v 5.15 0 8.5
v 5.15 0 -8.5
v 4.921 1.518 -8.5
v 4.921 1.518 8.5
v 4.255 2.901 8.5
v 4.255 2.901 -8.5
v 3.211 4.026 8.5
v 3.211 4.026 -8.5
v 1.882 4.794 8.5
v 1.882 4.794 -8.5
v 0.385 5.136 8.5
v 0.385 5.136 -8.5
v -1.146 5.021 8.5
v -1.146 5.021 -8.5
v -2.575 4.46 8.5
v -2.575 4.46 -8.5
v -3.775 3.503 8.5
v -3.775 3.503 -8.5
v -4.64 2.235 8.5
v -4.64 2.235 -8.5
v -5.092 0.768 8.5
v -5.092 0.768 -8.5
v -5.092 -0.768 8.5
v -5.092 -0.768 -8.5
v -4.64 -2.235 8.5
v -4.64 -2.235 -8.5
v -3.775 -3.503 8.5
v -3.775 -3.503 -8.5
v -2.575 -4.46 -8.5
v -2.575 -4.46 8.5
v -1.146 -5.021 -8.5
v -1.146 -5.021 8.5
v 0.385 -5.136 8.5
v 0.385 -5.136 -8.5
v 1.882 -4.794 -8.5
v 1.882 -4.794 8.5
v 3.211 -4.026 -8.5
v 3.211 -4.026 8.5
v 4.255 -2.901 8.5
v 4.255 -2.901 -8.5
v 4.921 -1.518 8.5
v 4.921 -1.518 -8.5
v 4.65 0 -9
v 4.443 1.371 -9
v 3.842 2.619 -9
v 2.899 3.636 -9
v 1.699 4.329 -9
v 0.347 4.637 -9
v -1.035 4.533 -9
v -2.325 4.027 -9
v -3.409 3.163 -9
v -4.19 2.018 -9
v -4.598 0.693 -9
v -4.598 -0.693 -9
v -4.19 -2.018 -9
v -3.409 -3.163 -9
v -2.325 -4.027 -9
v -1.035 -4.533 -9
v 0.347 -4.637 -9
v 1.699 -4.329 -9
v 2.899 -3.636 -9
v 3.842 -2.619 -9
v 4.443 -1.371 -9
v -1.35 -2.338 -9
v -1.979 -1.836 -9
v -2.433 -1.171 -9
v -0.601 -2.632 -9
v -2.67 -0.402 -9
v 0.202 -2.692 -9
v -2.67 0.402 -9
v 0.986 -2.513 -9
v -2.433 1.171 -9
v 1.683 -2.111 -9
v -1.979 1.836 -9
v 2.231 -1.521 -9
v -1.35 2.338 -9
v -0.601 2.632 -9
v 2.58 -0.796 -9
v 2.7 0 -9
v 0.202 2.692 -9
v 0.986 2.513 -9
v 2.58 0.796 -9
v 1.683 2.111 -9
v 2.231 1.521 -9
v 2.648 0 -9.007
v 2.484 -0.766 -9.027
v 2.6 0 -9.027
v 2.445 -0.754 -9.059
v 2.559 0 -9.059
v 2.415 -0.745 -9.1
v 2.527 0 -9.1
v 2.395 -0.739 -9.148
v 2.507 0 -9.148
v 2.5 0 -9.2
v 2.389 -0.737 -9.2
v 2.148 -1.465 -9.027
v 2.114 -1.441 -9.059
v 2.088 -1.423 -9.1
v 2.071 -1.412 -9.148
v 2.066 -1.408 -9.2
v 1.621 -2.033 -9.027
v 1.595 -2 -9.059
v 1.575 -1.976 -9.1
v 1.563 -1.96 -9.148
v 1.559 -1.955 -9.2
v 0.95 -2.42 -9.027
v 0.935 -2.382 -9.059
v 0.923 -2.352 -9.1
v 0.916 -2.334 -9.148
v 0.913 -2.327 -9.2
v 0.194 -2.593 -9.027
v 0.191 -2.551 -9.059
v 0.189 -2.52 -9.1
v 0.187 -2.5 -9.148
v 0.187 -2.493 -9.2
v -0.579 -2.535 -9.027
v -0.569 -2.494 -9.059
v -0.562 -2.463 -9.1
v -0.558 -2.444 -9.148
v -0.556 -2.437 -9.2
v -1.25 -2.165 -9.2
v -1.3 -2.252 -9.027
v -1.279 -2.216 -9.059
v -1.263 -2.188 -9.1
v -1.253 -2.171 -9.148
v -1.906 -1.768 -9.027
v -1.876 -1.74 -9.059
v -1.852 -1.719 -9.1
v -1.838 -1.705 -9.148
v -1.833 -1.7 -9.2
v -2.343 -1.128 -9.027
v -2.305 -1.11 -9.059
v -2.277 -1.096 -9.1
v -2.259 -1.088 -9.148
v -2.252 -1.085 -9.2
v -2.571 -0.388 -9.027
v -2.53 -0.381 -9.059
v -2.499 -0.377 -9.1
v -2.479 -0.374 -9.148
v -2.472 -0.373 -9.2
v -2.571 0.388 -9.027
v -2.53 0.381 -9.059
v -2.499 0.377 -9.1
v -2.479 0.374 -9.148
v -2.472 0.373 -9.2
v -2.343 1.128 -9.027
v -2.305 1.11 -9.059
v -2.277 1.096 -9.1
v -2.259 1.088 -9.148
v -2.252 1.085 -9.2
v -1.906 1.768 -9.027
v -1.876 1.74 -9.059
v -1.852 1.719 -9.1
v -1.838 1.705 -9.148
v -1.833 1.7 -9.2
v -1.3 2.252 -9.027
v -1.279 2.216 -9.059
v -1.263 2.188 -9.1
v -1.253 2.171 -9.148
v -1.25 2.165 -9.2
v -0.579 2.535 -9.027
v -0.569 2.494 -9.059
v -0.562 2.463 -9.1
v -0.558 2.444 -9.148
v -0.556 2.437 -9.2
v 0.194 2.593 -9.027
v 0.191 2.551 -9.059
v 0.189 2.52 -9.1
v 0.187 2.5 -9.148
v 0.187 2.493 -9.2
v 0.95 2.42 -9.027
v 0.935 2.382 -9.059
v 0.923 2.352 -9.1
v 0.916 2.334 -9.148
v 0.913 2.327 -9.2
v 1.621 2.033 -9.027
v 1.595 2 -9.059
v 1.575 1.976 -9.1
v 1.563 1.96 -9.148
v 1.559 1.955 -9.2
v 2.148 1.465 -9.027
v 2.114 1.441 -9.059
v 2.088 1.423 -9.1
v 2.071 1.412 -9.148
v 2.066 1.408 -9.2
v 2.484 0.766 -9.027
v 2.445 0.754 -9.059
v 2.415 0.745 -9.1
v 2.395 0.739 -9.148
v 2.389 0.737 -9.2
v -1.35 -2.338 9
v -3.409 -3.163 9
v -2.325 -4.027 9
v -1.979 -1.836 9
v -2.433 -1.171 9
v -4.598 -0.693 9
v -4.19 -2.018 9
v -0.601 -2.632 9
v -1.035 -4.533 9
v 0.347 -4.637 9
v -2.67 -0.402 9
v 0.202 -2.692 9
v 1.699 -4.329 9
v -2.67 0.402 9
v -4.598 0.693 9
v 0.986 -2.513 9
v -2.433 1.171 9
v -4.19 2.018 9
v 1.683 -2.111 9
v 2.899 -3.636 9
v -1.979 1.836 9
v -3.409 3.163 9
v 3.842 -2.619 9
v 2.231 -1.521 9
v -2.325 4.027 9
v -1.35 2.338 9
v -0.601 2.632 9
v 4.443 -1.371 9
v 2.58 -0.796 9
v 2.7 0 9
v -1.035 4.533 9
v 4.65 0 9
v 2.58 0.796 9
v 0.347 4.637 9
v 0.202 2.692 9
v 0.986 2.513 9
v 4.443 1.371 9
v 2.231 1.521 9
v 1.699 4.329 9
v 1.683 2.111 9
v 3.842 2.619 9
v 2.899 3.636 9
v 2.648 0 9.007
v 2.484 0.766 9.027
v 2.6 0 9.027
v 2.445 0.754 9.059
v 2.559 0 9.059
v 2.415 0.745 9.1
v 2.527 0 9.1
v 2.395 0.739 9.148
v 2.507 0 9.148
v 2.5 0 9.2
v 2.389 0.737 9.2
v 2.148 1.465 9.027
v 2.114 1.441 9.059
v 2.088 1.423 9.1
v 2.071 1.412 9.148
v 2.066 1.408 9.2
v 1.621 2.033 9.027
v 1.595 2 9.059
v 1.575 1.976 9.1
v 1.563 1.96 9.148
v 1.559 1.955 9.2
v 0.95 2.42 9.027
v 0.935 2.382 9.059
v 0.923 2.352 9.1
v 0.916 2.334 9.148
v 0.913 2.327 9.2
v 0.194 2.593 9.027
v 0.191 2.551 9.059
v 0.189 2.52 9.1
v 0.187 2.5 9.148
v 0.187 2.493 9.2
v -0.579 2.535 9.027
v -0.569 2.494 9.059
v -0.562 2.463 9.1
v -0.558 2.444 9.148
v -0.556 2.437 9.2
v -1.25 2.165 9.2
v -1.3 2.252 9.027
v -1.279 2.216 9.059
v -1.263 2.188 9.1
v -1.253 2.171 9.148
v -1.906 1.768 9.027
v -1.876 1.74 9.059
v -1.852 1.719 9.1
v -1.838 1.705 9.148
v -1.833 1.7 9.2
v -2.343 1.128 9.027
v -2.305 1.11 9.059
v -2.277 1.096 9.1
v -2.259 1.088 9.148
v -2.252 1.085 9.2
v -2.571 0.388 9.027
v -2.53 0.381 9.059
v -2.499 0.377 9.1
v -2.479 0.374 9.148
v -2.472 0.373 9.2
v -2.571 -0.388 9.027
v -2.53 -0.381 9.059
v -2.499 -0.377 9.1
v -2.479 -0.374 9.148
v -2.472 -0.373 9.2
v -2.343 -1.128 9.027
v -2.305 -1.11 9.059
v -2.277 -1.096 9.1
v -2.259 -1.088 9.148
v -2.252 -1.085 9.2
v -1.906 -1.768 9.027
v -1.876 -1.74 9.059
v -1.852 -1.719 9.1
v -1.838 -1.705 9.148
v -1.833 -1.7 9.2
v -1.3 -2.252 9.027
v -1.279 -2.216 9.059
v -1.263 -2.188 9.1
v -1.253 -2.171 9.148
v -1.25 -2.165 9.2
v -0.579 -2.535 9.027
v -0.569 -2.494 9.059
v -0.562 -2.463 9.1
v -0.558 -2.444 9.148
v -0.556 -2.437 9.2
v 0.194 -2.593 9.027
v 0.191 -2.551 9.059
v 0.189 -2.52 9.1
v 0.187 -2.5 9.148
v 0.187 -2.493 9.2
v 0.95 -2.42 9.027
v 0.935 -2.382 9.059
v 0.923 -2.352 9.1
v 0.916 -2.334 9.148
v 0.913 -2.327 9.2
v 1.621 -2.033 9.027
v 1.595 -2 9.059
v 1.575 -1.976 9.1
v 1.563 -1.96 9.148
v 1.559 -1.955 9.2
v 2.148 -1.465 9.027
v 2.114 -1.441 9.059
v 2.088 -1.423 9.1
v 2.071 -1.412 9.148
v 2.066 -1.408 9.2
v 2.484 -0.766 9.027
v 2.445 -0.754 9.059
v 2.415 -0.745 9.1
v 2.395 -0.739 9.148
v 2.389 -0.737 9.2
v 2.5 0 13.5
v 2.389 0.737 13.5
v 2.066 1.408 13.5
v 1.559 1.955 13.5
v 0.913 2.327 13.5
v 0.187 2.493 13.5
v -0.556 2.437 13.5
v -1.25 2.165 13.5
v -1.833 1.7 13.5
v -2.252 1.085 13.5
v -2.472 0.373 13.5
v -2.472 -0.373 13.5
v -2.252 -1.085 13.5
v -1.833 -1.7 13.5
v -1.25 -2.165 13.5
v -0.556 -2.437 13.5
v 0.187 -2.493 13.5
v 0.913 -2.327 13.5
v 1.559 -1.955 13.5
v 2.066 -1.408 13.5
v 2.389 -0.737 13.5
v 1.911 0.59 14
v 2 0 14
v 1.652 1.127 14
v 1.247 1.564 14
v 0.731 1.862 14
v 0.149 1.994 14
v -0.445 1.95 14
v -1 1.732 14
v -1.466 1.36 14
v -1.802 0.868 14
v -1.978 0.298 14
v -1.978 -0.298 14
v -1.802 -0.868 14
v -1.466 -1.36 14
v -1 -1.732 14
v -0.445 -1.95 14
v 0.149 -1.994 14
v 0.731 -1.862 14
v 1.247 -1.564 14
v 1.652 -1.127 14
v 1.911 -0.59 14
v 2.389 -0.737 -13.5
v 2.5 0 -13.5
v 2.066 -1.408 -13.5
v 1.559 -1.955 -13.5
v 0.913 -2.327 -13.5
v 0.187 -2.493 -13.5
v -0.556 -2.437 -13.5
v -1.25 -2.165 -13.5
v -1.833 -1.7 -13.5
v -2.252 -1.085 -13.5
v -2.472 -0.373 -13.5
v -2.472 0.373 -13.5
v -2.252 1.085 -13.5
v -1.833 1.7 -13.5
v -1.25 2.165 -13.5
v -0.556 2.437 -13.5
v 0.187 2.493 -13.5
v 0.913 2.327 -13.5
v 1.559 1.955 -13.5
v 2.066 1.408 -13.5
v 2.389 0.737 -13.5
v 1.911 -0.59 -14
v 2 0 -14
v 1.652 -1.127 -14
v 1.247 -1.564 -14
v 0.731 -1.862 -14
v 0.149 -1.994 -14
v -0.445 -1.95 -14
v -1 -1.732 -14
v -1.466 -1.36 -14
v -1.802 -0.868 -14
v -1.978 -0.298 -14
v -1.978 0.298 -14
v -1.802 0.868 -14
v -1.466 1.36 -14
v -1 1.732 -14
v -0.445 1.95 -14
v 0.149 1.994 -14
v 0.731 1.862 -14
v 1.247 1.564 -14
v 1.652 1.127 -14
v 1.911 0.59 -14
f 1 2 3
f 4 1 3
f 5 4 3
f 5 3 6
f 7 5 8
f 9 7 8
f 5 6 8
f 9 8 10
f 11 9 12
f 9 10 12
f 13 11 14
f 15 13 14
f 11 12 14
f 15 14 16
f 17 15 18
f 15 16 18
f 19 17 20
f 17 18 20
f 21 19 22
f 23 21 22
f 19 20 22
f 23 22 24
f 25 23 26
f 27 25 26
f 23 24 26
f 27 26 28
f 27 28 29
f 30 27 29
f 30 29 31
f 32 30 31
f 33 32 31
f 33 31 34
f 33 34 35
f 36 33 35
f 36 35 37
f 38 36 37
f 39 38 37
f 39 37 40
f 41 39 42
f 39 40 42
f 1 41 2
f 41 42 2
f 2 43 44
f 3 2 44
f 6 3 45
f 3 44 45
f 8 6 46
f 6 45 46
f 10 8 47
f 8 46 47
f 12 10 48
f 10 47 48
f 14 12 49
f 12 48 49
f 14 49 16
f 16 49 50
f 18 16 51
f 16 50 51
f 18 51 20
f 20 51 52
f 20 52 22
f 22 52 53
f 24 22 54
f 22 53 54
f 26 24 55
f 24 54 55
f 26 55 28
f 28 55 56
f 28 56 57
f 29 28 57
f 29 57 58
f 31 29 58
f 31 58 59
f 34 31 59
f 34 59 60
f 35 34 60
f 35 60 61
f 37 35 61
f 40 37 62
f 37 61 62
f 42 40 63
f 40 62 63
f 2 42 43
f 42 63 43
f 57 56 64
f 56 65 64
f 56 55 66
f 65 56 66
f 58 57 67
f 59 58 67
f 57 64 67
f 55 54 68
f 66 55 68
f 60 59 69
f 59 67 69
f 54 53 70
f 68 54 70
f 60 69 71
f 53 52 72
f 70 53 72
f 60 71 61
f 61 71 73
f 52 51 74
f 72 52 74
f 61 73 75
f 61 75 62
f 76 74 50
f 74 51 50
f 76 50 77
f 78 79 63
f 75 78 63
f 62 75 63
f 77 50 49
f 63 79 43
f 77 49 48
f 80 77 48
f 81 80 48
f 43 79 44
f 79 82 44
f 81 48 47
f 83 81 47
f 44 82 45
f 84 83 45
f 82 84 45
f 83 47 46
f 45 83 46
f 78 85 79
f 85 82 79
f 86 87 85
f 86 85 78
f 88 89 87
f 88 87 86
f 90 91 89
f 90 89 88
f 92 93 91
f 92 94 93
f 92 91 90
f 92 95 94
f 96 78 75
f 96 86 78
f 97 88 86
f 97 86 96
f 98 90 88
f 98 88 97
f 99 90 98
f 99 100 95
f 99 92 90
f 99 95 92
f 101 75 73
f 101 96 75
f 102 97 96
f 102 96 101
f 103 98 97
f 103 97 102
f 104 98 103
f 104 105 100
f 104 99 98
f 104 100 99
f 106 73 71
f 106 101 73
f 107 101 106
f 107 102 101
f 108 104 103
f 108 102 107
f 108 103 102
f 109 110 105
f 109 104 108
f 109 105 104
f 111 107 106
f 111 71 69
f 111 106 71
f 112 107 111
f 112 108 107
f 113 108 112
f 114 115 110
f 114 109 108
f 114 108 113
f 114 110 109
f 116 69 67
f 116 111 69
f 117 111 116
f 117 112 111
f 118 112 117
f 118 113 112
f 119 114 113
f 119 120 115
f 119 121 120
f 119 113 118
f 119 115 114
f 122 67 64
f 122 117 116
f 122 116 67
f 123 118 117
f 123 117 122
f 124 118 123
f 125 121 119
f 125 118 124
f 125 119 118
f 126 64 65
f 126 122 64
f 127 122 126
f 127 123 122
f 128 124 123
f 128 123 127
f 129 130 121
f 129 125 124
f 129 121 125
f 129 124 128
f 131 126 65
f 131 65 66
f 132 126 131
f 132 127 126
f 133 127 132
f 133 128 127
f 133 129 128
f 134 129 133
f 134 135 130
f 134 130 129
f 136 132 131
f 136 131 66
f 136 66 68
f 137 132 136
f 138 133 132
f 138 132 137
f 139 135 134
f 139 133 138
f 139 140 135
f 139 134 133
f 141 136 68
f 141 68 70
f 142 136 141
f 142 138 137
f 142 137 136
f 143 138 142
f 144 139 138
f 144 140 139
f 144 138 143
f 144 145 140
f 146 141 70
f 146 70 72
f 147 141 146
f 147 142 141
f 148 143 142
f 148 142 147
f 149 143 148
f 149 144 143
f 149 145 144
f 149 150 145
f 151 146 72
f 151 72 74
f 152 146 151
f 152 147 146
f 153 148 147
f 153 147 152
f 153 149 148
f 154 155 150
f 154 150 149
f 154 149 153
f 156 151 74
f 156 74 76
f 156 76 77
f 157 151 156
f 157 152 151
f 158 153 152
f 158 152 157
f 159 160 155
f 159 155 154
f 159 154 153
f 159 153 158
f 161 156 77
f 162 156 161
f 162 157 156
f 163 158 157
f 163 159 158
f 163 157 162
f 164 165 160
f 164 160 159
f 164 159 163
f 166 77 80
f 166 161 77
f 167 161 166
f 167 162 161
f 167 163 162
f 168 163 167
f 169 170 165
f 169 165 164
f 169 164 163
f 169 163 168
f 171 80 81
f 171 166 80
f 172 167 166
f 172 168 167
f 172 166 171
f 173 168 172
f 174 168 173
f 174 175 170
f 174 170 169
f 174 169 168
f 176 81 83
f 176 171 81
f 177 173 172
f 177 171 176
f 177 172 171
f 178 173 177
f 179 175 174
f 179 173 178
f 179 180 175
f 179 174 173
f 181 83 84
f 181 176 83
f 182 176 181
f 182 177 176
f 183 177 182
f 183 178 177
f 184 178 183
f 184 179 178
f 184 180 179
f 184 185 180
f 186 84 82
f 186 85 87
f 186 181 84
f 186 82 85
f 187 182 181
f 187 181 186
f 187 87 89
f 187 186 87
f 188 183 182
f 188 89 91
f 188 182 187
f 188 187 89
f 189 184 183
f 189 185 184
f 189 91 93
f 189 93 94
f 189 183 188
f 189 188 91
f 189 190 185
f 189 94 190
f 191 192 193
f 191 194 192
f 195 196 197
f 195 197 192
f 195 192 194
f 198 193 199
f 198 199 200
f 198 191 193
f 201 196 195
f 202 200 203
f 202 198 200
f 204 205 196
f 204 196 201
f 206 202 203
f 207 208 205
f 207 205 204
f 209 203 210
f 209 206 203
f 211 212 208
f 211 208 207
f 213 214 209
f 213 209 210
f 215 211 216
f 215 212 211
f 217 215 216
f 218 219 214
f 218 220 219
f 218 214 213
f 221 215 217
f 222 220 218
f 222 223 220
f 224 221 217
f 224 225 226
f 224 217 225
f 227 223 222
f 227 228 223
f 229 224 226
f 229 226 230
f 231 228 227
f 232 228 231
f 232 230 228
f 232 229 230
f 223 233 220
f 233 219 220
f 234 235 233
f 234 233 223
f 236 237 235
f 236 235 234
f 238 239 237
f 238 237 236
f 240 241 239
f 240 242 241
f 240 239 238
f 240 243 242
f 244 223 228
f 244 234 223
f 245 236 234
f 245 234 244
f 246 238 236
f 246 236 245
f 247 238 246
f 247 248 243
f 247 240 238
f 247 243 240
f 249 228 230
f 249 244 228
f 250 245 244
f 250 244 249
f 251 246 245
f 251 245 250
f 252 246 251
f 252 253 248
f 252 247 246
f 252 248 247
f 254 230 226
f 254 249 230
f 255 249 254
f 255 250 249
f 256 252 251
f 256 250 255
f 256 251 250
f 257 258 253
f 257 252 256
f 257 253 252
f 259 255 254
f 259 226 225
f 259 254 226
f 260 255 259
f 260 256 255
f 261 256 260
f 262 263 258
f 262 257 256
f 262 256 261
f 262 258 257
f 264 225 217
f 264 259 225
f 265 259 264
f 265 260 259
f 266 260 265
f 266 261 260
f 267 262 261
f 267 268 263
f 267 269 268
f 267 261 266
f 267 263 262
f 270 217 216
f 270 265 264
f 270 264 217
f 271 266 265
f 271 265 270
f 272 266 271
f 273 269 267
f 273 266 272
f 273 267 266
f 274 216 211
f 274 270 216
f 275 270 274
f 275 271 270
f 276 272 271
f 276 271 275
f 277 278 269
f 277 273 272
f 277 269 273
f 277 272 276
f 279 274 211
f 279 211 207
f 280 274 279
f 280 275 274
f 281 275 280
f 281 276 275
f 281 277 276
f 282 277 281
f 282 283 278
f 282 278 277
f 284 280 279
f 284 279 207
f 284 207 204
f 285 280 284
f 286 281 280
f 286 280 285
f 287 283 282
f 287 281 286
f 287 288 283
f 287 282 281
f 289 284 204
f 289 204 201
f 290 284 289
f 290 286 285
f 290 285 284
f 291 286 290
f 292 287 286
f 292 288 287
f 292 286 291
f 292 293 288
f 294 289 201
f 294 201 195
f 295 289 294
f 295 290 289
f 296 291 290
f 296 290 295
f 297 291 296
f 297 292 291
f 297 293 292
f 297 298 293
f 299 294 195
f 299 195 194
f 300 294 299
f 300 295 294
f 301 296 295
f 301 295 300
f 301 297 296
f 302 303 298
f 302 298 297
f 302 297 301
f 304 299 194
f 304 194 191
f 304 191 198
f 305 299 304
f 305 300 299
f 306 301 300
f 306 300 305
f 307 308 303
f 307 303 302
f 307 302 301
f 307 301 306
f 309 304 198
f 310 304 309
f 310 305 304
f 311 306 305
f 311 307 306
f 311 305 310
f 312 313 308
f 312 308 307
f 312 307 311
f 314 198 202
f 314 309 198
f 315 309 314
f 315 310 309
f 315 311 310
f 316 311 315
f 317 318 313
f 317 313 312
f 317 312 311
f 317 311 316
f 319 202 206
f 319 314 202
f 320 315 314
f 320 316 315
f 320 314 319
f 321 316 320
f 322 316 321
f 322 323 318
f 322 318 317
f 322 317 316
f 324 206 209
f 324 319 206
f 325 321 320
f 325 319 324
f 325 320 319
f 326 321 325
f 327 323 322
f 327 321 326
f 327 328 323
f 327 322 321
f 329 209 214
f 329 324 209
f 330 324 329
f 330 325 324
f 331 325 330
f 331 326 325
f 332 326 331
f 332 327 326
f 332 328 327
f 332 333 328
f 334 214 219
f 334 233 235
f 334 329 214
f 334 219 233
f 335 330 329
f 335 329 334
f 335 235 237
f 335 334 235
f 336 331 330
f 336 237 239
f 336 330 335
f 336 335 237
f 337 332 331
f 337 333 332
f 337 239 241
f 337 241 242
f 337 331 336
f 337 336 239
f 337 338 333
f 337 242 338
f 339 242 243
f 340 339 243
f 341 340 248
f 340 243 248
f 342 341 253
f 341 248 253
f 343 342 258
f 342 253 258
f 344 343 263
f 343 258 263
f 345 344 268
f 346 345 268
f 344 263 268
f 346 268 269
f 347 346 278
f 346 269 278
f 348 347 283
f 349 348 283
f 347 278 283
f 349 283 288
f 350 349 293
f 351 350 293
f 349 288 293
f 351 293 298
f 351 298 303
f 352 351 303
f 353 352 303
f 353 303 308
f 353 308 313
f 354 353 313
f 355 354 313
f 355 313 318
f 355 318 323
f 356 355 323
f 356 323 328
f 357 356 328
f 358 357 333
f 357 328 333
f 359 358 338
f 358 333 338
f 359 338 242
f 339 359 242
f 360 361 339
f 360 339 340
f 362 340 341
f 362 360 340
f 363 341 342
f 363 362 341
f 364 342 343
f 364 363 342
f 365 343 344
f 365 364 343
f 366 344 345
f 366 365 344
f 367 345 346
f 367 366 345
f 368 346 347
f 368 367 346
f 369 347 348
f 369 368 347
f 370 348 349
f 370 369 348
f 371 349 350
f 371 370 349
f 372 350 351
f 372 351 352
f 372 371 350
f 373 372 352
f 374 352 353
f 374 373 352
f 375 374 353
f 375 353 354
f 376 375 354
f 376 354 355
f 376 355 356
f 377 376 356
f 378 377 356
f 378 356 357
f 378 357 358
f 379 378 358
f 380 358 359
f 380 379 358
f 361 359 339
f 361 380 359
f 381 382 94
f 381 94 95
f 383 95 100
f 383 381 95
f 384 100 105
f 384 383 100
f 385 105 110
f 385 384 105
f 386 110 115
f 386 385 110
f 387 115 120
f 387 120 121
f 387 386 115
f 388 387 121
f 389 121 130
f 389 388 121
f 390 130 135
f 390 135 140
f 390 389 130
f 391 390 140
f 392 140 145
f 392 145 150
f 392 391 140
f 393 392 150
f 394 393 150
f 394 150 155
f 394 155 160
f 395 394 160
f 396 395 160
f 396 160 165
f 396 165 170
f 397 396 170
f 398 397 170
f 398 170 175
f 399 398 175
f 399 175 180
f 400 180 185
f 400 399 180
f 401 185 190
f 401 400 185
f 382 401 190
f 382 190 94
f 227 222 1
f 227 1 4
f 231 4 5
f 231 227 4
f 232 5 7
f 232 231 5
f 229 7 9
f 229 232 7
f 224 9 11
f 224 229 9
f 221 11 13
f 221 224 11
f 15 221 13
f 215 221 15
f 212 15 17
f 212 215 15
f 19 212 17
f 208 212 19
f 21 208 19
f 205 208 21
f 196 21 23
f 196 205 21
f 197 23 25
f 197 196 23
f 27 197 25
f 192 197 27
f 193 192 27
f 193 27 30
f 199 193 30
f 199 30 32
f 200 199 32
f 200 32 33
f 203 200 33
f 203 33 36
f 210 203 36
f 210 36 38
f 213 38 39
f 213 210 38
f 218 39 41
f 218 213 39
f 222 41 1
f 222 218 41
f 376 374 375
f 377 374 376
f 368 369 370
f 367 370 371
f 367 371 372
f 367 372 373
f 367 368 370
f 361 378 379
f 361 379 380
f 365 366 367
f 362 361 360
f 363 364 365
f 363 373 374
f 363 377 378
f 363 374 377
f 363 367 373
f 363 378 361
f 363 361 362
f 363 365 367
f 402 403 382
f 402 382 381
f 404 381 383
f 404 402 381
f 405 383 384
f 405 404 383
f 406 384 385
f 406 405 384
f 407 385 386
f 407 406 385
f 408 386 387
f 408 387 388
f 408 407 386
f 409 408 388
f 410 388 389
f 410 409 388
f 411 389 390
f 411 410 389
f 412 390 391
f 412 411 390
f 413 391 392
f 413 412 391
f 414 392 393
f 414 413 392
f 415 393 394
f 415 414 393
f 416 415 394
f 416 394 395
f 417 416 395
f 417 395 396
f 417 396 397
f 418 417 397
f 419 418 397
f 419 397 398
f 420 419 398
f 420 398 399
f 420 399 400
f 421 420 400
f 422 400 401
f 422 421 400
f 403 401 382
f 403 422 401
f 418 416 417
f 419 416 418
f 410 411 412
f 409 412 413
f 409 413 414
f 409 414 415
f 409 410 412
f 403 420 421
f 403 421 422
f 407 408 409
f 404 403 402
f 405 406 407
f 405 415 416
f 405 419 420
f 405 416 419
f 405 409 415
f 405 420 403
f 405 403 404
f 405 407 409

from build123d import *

# Parameters (mm, degrees)
BOSS_EXTRUDE1_DEPTH      = 9
BOSS_EXTRUDE1_DEPTH_BACK = 9
SKETCH1_R                = 5.15
SKETCH2_R                = 2.5
BOSS_EXTRUDE2_DEPTH      = 5
BOSS_EXTRUDE3_START      = 5
SKETCH3_R                = 2.5
BOSS_EXTRUDE3_DEPTH      = 5
CHAMFER2_SIZE            = 0.5
FILLET1_R                = 0.2


with BuildPart() as part:
    # Sketch1 → Boss-Extrude1 (new, two sides: drawn at the far end of the back side and taken through both)
    with BuildSketch(Plane.XY.offset(-BOSS_EXTRUDE1_DEPTH_BACK)):
        Circle(SKETCH1_R)
    extrude(amount=BOSS_EXTRUDE1_DEPTH + BOSS_EXTRUDE1_DEPTH_BACK)

    # Sketch2 → Boss-Extrude2 (add)
    with BuildSketch(Plane.XY.offset(9)):
        Circle(SKETCH2_R)
    extrude(amount=BOSS_EXTRUDE2_DEPTH)

    # Sketch3 → Boss-Extrude3 (add)
    with BuildSketch(Plane(origin=(0, 0, -9), x_dir=(-1, 0, 0), z_dir=(0, 0, -1)).offset(BOSS_EXTRUDE3_START)):
        Circle(SKETCH3_R)
    extrude(amount=-BOSS_EXTRUDE3_DEPTH)

    # Chamfer2
    chamfer2_edges = [part.edges().sort_by_distance(p)[0] for p in [
        (2.5, 0, -14),
        (-2.5, 0, 14),
        (-5.15, 0, -9),
        (-5.15, 0, 9),
    ]]
    chamfer(chamfer2_edges, length=CHAMFER2_SIZE)

    # Fillet1
    fillet1_edges = [part.edges().sort_by_distance(p)[0] for p in [
        (2.5, 0, -9),
        (-2.5, 0, 9),
    ]]
    fillet(fillet1_edges, radius=FILLET1_R)


solid = part.part
